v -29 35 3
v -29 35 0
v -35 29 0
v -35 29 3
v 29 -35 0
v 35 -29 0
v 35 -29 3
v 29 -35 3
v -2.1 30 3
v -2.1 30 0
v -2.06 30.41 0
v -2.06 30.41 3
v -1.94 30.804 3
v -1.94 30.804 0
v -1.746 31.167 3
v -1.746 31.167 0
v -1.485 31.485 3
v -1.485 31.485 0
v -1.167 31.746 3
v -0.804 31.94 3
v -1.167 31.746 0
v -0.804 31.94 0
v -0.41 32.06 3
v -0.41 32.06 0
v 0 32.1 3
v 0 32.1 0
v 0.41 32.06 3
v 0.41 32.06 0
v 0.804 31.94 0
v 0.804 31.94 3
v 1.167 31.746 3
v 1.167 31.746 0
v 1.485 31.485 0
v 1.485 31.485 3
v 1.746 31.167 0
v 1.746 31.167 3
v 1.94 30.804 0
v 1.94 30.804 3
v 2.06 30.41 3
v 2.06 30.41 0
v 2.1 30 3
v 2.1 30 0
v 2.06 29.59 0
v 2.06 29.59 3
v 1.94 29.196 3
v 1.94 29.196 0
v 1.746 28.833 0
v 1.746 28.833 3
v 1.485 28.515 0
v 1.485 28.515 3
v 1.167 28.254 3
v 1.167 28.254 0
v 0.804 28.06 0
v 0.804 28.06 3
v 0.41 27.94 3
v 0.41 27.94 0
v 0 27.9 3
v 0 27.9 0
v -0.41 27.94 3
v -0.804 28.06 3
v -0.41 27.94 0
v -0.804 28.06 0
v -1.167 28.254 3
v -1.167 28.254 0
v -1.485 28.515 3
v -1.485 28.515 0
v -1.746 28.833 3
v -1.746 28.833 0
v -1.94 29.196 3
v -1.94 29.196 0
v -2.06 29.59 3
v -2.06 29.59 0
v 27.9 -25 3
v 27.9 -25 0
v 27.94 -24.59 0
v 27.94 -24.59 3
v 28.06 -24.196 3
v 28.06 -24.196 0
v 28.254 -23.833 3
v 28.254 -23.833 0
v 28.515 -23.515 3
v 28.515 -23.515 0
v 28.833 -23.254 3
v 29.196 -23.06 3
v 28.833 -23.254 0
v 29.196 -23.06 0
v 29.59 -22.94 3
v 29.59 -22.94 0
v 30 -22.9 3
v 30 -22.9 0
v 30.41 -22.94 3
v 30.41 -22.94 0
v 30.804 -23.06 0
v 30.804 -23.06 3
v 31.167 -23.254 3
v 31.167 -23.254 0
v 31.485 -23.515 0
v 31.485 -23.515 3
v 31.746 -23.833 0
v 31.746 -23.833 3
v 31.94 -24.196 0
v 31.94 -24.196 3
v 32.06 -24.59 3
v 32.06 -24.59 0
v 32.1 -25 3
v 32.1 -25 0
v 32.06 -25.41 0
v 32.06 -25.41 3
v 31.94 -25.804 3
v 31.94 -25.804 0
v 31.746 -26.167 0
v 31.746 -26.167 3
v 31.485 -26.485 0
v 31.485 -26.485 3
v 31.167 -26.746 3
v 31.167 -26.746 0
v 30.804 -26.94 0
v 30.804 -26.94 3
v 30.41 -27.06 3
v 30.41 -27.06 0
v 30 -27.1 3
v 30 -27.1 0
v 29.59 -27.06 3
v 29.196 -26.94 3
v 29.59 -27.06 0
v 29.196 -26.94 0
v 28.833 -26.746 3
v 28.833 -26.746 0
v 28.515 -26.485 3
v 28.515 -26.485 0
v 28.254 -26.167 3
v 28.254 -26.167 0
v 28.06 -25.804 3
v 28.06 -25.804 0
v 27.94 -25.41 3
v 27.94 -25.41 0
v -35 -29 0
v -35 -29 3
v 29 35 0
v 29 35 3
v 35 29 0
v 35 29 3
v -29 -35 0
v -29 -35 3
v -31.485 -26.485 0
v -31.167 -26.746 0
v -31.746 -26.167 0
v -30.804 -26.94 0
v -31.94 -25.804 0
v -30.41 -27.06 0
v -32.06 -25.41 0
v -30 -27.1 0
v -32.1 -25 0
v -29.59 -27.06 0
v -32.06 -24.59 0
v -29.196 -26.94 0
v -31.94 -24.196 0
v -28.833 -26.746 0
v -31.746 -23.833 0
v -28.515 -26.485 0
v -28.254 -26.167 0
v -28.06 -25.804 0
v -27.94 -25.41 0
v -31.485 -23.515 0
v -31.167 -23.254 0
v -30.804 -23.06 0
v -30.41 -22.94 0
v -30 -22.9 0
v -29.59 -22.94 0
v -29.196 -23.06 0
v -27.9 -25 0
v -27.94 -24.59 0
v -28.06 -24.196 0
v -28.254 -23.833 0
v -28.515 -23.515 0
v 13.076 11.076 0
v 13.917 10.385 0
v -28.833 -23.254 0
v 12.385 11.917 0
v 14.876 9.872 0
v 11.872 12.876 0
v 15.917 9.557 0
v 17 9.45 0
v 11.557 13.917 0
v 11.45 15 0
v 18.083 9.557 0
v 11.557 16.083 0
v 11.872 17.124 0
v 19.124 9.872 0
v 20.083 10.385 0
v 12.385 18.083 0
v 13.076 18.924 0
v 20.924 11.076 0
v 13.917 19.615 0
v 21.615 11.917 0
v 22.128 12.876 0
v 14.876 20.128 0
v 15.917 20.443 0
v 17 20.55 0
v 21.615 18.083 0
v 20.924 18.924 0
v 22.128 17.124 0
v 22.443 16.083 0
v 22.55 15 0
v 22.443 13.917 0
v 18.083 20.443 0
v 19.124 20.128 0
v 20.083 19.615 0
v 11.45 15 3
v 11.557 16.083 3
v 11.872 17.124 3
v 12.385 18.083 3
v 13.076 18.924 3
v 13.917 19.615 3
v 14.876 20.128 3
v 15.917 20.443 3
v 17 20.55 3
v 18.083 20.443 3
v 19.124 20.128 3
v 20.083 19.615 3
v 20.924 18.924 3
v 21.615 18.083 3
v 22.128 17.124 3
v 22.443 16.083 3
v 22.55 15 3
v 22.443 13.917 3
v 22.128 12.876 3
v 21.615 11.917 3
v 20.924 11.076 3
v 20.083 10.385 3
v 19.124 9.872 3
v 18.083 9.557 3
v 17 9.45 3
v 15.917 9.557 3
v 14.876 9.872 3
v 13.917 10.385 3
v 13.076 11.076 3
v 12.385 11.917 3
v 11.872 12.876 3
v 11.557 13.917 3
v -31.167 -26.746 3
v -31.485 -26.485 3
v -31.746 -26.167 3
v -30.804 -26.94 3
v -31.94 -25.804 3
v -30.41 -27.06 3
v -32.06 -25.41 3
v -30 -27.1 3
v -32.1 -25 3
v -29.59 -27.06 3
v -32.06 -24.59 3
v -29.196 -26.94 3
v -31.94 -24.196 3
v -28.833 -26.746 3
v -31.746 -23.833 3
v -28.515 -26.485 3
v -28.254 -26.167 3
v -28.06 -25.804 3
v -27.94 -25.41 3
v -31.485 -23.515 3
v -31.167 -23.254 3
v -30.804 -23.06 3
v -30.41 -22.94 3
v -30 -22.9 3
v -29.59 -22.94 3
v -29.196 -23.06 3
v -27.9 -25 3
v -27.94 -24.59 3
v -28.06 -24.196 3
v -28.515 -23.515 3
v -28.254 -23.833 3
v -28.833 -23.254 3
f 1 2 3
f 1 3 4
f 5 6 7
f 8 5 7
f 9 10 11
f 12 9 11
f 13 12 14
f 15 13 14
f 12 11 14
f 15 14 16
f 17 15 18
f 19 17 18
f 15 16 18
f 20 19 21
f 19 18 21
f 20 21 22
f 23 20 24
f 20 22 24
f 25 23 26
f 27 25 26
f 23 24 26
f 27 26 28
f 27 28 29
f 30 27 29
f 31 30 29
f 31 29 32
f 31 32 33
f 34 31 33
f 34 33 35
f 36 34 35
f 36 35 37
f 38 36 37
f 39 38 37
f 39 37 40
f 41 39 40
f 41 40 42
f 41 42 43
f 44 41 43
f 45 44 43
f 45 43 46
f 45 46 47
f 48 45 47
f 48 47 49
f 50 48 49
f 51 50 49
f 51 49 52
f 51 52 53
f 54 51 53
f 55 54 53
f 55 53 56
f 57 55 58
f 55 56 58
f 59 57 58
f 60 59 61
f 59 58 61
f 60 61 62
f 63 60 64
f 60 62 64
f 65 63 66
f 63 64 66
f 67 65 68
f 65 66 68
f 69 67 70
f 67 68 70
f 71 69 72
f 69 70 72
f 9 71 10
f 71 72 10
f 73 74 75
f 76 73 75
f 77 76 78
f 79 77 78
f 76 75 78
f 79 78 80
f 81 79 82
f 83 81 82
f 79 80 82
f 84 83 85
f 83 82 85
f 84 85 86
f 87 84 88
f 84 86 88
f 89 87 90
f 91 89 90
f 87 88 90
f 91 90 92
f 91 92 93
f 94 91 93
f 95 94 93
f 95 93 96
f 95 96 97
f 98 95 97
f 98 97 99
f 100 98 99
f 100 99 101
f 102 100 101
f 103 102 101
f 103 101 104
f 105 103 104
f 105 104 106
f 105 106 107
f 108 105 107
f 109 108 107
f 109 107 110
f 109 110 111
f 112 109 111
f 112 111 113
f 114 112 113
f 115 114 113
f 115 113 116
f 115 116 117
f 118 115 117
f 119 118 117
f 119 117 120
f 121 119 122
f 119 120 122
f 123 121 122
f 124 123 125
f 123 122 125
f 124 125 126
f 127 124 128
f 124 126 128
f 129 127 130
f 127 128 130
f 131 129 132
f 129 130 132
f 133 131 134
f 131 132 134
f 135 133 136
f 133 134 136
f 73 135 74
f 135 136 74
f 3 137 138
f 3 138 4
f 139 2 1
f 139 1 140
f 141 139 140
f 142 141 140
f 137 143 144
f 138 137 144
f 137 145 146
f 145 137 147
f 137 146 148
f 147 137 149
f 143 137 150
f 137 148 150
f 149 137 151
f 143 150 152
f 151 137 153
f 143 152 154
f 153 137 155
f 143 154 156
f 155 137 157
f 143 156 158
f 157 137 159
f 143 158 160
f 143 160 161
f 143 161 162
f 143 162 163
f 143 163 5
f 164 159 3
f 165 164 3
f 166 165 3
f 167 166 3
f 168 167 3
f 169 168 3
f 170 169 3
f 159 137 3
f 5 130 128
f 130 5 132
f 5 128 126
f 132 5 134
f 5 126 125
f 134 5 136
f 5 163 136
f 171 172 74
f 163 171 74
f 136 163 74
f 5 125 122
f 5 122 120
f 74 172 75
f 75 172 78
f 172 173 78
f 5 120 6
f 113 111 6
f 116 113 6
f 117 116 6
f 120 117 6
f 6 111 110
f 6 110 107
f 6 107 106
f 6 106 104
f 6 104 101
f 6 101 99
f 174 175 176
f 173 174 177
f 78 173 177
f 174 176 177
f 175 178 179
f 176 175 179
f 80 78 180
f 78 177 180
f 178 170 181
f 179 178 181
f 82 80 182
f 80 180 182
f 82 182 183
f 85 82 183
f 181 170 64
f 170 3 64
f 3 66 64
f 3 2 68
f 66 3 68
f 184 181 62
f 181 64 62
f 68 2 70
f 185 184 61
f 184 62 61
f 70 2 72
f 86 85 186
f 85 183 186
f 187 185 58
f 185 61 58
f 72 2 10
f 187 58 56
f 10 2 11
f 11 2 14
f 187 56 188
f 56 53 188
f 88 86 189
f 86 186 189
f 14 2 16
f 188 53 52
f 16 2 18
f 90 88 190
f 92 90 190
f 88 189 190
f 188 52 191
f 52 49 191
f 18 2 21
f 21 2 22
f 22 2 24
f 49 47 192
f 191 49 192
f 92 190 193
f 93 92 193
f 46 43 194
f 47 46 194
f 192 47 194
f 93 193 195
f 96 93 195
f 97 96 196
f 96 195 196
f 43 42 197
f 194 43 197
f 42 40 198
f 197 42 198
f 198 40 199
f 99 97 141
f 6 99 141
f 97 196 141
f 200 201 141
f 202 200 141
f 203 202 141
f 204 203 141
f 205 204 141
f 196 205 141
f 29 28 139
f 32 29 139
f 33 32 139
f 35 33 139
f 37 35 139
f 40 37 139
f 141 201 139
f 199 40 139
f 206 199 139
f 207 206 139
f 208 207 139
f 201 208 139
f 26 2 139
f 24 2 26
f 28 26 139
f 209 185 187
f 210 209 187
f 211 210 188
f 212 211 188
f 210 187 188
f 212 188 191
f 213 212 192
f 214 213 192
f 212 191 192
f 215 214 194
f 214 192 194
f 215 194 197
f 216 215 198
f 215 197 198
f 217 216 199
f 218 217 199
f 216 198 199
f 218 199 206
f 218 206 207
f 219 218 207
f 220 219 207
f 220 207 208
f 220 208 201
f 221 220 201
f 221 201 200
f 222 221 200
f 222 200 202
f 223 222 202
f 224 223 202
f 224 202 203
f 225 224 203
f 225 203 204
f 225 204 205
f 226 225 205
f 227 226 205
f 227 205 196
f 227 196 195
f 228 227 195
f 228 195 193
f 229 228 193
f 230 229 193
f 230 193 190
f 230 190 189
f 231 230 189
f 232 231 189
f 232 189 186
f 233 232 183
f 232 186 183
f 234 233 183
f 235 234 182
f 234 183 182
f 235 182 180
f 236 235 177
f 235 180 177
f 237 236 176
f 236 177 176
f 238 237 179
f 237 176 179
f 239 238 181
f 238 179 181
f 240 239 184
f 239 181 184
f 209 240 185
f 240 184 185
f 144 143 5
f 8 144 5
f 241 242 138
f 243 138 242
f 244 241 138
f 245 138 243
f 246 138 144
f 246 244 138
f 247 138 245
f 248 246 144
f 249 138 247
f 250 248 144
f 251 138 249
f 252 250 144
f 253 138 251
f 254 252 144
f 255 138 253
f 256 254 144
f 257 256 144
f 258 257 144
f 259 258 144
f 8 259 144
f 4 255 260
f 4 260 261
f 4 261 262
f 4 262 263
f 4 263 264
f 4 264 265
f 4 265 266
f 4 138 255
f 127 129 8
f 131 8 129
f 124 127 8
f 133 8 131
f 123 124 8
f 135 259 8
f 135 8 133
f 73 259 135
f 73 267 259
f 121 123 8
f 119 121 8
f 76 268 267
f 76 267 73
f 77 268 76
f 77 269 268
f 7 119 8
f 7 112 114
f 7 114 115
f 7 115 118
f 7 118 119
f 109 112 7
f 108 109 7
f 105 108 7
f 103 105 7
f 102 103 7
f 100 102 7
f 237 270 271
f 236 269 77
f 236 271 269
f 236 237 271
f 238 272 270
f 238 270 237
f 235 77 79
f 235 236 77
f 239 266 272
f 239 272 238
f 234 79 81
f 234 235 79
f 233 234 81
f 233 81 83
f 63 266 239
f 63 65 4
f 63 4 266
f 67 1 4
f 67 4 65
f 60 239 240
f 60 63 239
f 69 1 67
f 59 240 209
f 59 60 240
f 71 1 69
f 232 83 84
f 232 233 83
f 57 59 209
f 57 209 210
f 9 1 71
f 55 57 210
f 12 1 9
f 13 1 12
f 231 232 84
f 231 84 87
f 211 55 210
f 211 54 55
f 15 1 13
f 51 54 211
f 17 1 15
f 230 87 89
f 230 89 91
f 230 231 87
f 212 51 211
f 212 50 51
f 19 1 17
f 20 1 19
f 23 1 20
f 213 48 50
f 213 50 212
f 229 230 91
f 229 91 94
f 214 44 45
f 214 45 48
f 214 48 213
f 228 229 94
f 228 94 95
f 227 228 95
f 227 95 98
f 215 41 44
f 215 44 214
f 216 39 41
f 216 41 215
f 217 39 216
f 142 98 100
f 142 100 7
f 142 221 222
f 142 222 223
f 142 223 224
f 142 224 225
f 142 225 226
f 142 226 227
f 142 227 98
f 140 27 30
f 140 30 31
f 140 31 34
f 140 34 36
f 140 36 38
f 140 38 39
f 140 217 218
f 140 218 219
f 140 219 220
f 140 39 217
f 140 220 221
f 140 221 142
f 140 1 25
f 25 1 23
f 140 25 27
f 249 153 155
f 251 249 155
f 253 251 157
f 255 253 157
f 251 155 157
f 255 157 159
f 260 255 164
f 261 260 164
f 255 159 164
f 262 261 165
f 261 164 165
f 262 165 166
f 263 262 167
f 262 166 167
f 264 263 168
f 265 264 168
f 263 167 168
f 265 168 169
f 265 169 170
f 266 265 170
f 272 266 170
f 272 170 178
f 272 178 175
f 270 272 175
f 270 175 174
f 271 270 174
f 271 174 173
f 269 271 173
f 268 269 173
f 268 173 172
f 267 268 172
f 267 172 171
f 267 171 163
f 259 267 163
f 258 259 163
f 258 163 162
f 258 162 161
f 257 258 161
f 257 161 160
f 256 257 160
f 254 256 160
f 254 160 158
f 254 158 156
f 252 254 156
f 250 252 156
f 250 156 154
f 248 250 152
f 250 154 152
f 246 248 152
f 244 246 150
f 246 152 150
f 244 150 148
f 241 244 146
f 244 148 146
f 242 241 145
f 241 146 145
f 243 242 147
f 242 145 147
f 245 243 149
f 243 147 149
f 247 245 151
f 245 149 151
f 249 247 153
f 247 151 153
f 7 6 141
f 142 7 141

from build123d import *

# Parameters (mm, degrees)
SKETCH_1_W          = 70
SKETCH_1_H          = 70
EXTRUDE_1_DEPTH     = 3
CHAMFER_1_SIZE      = 6
SKETCH_2_R          = 2.1
CUT_EXTRUDE_1_DEPTH = 50.588305073
SKETCH_3_R          = 5.55
CUT_EXTRUDE_2_DEPTH = 50.588305073


with BuildPart() as part:
    # 草圖1 → 填料-伸長1 (new body)
    with BuildSketch(Plane.XY):
        Rectangle(SKETCH_1_W, SKETCH_1_H)
    extrude(amount=EXTRUDE_1_DEPTH)

    # 導角1
    chamfer_1_edges = [part.edges().sort_by_distance(p)[0] for p in [
        (-35, 35, 1.5),
        (35, 35, 1.5),
        (35, -35, 1.5),
        (-35, -35, 1.5),
    ]]
    chamfer(chamfer_1_edges, length=CHAMFER_1_SIZE)

    # 草圖2 → 除料-伸長1 (cut, through all)
    with BuildSketch(Plane(origin=(0, 0, 0), x_dir=(-1, 0, 0), z_dir=(0, 0, -1))):
        with Locations((0, 30)):
            Circle(SKETCH_2_R)
        with Locations((-30, -25)):
            Circle(SKETCH_2_R)
        with Locations((30, -25)):
            Circle(SKETCH_2_R)
    extrude(amount=-CUT_EXTRUDE_1_DEPTH, mode=Mode.SUBTRACT)

    # 草圖3 → 除料-伸長2 (cut, through all)
    with BuildSketch(Plane(origin=(0, 0, 0), x_dir=(-1, 0, 0), z_dir=(0, 0, -1))):
        with Locations((-17, 15)):
            Circle(SKETCH_3_R)
    extrude(amount=-CUT_EXTRUDE_2_DEPTH, mode=Mode.SUBTRACT)


solid = part.part
